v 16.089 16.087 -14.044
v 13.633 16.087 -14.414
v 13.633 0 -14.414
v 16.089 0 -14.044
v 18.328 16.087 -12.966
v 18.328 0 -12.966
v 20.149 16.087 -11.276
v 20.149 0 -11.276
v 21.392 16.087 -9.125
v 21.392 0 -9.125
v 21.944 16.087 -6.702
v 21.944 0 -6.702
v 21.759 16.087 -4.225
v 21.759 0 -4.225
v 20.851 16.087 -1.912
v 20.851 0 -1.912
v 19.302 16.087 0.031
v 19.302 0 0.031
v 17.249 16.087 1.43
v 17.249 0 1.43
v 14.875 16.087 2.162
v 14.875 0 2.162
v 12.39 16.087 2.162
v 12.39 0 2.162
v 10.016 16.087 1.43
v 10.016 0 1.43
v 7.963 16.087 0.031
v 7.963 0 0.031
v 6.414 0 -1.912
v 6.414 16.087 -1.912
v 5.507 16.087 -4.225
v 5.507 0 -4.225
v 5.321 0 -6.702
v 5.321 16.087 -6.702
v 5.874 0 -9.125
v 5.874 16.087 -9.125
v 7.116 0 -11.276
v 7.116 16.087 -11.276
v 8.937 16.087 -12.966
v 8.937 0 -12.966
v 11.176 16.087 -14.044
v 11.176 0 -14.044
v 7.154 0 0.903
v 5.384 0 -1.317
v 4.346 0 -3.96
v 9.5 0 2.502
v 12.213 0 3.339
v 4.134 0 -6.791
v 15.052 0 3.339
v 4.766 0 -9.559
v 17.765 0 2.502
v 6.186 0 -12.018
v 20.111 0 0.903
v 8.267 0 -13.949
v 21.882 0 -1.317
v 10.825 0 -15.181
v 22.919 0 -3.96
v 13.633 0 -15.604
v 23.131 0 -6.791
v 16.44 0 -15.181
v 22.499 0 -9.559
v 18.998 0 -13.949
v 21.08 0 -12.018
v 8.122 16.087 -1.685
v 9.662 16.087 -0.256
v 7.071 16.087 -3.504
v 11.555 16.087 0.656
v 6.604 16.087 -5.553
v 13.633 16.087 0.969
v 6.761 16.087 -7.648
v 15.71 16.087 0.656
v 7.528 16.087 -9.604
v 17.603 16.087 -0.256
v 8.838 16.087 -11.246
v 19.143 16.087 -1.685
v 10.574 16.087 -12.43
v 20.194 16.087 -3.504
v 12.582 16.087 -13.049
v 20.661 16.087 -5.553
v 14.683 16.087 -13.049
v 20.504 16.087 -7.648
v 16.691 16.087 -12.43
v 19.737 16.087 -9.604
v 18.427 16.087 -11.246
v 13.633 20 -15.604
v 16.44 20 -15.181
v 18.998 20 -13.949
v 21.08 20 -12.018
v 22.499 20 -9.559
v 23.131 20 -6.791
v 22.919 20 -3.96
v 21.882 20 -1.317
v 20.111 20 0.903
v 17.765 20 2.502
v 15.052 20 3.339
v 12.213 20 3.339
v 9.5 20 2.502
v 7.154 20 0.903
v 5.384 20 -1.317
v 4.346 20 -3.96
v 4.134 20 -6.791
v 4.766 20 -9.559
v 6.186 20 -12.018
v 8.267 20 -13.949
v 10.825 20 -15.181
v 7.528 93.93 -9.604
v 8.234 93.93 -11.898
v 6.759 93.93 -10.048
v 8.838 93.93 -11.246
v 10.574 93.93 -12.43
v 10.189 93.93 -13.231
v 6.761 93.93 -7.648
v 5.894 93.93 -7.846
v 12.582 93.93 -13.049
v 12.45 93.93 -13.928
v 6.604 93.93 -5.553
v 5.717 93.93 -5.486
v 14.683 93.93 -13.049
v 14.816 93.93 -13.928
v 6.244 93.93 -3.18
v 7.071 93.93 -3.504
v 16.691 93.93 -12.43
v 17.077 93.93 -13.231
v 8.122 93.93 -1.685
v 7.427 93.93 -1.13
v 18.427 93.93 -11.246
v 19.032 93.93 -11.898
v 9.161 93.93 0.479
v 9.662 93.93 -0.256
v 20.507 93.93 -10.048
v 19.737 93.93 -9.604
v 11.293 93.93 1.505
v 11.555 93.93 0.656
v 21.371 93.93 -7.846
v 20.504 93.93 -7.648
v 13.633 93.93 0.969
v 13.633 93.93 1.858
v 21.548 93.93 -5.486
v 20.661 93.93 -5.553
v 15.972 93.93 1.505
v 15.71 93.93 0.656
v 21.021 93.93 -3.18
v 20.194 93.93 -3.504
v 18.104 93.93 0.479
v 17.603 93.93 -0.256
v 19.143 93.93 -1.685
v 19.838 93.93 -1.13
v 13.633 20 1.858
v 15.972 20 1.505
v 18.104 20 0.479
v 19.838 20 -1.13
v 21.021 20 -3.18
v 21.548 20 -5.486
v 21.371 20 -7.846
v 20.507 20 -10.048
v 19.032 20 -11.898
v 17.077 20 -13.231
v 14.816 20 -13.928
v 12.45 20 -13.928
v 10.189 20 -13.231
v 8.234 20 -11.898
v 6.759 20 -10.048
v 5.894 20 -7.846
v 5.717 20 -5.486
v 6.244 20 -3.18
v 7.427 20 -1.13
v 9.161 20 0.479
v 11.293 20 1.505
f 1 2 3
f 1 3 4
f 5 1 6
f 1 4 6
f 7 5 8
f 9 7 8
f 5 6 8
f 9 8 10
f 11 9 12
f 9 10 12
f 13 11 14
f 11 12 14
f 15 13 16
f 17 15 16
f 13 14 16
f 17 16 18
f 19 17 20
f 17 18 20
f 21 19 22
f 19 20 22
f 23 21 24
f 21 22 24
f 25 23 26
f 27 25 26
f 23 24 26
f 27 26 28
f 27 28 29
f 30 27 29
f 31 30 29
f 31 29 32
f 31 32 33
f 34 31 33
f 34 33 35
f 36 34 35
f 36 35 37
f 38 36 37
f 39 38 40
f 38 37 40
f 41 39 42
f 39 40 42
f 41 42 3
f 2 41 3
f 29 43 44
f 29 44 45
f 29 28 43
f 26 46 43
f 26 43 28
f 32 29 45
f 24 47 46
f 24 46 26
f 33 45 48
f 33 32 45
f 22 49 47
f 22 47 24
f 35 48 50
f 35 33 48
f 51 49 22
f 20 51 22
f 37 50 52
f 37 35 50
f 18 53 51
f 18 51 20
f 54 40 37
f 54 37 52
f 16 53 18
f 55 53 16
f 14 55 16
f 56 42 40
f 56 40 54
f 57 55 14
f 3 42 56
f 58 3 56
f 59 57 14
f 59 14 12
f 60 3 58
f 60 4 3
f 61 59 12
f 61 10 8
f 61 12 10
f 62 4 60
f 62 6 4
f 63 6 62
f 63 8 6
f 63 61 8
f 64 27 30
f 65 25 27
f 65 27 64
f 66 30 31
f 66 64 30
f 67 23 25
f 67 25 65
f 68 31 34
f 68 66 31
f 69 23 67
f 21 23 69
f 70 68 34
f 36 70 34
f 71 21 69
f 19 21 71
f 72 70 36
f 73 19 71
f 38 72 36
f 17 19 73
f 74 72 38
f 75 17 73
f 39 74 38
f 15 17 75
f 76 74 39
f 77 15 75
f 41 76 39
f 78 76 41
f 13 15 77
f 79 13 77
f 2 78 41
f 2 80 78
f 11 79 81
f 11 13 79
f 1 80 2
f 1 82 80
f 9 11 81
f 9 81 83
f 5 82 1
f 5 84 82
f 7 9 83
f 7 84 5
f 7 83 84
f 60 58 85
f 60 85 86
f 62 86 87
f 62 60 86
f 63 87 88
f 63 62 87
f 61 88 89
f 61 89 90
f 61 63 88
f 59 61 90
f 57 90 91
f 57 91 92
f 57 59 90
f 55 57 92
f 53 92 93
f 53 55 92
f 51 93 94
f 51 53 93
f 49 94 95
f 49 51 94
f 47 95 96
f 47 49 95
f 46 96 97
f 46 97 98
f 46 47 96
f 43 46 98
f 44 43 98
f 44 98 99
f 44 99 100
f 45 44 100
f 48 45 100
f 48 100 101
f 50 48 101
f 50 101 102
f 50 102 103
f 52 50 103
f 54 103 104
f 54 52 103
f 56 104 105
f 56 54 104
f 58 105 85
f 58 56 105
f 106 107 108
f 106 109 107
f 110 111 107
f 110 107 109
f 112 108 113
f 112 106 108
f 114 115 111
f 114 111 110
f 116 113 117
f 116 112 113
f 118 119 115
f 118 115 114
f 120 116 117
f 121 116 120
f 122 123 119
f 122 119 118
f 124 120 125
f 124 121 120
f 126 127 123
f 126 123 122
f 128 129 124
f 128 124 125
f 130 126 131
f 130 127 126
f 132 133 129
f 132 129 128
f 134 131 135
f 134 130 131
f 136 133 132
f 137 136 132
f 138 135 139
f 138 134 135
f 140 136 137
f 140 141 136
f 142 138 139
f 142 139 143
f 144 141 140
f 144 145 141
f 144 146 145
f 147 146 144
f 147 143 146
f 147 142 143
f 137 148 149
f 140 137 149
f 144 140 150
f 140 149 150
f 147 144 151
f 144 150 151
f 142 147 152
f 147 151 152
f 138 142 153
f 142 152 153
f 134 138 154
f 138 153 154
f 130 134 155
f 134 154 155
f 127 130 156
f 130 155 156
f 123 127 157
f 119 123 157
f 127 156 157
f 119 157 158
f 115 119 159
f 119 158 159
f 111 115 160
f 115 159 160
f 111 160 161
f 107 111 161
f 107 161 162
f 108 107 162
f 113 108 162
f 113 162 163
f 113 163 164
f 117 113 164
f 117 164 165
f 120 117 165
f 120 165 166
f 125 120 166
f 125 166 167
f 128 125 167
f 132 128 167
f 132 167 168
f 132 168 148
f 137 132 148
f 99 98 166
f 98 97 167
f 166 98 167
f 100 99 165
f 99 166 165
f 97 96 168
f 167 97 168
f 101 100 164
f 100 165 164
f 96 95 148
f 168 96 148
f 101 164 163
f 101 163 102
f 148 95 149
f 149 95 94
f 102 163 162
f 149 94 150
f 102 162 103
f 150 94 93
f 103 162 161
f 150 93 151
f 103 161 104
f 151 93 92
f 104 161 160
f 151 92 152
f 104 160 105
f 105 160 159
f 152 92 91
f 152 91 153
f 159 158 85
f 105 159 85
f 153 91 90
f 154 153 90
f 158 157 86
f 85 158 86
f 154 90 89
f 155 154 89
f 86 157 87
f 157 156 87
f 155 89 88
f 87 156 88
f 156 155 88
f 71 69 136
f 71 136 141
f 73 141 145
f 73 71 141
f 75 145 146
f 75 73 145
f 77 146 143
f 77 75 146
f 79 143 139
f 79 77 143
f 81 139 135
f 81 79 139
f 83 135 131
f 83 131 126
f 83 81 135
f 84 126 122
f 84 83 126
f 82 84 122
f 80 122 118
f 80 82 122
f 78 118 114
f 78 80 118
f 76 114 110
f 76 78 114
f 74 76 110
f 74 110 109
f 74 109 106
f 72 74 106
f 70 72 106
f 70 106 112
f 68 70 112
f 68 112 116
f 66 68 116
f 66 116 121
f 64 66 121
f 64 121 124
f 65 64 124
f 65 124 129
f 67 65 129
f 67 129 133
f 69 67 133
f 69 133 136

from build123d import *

# Parameters (mm, degrees)
SKETCH1_R           = 7.9375
SKETCH1_R_2         = 7.0485
BOSS_EXTRUDE1_DEPTH = 93.93
SKETCH2_R           = 9.525
SKETCH2_R_2         = 7.9375
BOSS_EXTRUDE2_DEPTH = 20
SKETCH3_R           = 8.33501
CUT_EXTRUDE1_DEPTH  = 16.086664195


with BuildPart() as part:
    # Sketch1 → Boss-Extrude1 (new body)
    with BuildSketch(Plane(origin=(0, 0, 0), x_dir=(1, 0, 0), z_dir=(0, 1, 0))):
        with Locations(Location((13.632659162, 6.079429086, 0), (0, 0, 270))):
            Circle(SKETCH1_R)
        with Locations(Location((13.632659162, 6.079429086, 0), (0, 0, 270))):
            Circle(SKETCH1_R_2, mode=Mode.SUBTRACT)
    extrude(amount=BOSS_EXTRUDE1_DEPTH)

    # Sketch2 → Boss-Extrude2 (add)
    with BuildSketch(Plane.XZ):
        with Locations(Location((13.632659162, -6.079429086, 0), (0, 0, 270))):
            Circle(SKETCH2_R)
        with Locations(Location((13.632659162, -6.079429086, 0), (0, 0, 270))):
            Circle(SKETCH2_R_2, mode=Mode.SUBTRACT)
    extrude(amount=-BOSS_EXTRUDE2_DEPTH)

    # Sketch3 → Cut-Extrude1 (cut)
    with BuildSketch(Plane.XZ):
        with Locations(Location((13.632659162, -6.079429086, 0), (0, 0, 270))):
            Circle(SKETCH3_R)
    extrude(amount=-CUT_EXTRUDE1_DEPTH, mode=Mode.SUBTRACT)


solid = part.part
